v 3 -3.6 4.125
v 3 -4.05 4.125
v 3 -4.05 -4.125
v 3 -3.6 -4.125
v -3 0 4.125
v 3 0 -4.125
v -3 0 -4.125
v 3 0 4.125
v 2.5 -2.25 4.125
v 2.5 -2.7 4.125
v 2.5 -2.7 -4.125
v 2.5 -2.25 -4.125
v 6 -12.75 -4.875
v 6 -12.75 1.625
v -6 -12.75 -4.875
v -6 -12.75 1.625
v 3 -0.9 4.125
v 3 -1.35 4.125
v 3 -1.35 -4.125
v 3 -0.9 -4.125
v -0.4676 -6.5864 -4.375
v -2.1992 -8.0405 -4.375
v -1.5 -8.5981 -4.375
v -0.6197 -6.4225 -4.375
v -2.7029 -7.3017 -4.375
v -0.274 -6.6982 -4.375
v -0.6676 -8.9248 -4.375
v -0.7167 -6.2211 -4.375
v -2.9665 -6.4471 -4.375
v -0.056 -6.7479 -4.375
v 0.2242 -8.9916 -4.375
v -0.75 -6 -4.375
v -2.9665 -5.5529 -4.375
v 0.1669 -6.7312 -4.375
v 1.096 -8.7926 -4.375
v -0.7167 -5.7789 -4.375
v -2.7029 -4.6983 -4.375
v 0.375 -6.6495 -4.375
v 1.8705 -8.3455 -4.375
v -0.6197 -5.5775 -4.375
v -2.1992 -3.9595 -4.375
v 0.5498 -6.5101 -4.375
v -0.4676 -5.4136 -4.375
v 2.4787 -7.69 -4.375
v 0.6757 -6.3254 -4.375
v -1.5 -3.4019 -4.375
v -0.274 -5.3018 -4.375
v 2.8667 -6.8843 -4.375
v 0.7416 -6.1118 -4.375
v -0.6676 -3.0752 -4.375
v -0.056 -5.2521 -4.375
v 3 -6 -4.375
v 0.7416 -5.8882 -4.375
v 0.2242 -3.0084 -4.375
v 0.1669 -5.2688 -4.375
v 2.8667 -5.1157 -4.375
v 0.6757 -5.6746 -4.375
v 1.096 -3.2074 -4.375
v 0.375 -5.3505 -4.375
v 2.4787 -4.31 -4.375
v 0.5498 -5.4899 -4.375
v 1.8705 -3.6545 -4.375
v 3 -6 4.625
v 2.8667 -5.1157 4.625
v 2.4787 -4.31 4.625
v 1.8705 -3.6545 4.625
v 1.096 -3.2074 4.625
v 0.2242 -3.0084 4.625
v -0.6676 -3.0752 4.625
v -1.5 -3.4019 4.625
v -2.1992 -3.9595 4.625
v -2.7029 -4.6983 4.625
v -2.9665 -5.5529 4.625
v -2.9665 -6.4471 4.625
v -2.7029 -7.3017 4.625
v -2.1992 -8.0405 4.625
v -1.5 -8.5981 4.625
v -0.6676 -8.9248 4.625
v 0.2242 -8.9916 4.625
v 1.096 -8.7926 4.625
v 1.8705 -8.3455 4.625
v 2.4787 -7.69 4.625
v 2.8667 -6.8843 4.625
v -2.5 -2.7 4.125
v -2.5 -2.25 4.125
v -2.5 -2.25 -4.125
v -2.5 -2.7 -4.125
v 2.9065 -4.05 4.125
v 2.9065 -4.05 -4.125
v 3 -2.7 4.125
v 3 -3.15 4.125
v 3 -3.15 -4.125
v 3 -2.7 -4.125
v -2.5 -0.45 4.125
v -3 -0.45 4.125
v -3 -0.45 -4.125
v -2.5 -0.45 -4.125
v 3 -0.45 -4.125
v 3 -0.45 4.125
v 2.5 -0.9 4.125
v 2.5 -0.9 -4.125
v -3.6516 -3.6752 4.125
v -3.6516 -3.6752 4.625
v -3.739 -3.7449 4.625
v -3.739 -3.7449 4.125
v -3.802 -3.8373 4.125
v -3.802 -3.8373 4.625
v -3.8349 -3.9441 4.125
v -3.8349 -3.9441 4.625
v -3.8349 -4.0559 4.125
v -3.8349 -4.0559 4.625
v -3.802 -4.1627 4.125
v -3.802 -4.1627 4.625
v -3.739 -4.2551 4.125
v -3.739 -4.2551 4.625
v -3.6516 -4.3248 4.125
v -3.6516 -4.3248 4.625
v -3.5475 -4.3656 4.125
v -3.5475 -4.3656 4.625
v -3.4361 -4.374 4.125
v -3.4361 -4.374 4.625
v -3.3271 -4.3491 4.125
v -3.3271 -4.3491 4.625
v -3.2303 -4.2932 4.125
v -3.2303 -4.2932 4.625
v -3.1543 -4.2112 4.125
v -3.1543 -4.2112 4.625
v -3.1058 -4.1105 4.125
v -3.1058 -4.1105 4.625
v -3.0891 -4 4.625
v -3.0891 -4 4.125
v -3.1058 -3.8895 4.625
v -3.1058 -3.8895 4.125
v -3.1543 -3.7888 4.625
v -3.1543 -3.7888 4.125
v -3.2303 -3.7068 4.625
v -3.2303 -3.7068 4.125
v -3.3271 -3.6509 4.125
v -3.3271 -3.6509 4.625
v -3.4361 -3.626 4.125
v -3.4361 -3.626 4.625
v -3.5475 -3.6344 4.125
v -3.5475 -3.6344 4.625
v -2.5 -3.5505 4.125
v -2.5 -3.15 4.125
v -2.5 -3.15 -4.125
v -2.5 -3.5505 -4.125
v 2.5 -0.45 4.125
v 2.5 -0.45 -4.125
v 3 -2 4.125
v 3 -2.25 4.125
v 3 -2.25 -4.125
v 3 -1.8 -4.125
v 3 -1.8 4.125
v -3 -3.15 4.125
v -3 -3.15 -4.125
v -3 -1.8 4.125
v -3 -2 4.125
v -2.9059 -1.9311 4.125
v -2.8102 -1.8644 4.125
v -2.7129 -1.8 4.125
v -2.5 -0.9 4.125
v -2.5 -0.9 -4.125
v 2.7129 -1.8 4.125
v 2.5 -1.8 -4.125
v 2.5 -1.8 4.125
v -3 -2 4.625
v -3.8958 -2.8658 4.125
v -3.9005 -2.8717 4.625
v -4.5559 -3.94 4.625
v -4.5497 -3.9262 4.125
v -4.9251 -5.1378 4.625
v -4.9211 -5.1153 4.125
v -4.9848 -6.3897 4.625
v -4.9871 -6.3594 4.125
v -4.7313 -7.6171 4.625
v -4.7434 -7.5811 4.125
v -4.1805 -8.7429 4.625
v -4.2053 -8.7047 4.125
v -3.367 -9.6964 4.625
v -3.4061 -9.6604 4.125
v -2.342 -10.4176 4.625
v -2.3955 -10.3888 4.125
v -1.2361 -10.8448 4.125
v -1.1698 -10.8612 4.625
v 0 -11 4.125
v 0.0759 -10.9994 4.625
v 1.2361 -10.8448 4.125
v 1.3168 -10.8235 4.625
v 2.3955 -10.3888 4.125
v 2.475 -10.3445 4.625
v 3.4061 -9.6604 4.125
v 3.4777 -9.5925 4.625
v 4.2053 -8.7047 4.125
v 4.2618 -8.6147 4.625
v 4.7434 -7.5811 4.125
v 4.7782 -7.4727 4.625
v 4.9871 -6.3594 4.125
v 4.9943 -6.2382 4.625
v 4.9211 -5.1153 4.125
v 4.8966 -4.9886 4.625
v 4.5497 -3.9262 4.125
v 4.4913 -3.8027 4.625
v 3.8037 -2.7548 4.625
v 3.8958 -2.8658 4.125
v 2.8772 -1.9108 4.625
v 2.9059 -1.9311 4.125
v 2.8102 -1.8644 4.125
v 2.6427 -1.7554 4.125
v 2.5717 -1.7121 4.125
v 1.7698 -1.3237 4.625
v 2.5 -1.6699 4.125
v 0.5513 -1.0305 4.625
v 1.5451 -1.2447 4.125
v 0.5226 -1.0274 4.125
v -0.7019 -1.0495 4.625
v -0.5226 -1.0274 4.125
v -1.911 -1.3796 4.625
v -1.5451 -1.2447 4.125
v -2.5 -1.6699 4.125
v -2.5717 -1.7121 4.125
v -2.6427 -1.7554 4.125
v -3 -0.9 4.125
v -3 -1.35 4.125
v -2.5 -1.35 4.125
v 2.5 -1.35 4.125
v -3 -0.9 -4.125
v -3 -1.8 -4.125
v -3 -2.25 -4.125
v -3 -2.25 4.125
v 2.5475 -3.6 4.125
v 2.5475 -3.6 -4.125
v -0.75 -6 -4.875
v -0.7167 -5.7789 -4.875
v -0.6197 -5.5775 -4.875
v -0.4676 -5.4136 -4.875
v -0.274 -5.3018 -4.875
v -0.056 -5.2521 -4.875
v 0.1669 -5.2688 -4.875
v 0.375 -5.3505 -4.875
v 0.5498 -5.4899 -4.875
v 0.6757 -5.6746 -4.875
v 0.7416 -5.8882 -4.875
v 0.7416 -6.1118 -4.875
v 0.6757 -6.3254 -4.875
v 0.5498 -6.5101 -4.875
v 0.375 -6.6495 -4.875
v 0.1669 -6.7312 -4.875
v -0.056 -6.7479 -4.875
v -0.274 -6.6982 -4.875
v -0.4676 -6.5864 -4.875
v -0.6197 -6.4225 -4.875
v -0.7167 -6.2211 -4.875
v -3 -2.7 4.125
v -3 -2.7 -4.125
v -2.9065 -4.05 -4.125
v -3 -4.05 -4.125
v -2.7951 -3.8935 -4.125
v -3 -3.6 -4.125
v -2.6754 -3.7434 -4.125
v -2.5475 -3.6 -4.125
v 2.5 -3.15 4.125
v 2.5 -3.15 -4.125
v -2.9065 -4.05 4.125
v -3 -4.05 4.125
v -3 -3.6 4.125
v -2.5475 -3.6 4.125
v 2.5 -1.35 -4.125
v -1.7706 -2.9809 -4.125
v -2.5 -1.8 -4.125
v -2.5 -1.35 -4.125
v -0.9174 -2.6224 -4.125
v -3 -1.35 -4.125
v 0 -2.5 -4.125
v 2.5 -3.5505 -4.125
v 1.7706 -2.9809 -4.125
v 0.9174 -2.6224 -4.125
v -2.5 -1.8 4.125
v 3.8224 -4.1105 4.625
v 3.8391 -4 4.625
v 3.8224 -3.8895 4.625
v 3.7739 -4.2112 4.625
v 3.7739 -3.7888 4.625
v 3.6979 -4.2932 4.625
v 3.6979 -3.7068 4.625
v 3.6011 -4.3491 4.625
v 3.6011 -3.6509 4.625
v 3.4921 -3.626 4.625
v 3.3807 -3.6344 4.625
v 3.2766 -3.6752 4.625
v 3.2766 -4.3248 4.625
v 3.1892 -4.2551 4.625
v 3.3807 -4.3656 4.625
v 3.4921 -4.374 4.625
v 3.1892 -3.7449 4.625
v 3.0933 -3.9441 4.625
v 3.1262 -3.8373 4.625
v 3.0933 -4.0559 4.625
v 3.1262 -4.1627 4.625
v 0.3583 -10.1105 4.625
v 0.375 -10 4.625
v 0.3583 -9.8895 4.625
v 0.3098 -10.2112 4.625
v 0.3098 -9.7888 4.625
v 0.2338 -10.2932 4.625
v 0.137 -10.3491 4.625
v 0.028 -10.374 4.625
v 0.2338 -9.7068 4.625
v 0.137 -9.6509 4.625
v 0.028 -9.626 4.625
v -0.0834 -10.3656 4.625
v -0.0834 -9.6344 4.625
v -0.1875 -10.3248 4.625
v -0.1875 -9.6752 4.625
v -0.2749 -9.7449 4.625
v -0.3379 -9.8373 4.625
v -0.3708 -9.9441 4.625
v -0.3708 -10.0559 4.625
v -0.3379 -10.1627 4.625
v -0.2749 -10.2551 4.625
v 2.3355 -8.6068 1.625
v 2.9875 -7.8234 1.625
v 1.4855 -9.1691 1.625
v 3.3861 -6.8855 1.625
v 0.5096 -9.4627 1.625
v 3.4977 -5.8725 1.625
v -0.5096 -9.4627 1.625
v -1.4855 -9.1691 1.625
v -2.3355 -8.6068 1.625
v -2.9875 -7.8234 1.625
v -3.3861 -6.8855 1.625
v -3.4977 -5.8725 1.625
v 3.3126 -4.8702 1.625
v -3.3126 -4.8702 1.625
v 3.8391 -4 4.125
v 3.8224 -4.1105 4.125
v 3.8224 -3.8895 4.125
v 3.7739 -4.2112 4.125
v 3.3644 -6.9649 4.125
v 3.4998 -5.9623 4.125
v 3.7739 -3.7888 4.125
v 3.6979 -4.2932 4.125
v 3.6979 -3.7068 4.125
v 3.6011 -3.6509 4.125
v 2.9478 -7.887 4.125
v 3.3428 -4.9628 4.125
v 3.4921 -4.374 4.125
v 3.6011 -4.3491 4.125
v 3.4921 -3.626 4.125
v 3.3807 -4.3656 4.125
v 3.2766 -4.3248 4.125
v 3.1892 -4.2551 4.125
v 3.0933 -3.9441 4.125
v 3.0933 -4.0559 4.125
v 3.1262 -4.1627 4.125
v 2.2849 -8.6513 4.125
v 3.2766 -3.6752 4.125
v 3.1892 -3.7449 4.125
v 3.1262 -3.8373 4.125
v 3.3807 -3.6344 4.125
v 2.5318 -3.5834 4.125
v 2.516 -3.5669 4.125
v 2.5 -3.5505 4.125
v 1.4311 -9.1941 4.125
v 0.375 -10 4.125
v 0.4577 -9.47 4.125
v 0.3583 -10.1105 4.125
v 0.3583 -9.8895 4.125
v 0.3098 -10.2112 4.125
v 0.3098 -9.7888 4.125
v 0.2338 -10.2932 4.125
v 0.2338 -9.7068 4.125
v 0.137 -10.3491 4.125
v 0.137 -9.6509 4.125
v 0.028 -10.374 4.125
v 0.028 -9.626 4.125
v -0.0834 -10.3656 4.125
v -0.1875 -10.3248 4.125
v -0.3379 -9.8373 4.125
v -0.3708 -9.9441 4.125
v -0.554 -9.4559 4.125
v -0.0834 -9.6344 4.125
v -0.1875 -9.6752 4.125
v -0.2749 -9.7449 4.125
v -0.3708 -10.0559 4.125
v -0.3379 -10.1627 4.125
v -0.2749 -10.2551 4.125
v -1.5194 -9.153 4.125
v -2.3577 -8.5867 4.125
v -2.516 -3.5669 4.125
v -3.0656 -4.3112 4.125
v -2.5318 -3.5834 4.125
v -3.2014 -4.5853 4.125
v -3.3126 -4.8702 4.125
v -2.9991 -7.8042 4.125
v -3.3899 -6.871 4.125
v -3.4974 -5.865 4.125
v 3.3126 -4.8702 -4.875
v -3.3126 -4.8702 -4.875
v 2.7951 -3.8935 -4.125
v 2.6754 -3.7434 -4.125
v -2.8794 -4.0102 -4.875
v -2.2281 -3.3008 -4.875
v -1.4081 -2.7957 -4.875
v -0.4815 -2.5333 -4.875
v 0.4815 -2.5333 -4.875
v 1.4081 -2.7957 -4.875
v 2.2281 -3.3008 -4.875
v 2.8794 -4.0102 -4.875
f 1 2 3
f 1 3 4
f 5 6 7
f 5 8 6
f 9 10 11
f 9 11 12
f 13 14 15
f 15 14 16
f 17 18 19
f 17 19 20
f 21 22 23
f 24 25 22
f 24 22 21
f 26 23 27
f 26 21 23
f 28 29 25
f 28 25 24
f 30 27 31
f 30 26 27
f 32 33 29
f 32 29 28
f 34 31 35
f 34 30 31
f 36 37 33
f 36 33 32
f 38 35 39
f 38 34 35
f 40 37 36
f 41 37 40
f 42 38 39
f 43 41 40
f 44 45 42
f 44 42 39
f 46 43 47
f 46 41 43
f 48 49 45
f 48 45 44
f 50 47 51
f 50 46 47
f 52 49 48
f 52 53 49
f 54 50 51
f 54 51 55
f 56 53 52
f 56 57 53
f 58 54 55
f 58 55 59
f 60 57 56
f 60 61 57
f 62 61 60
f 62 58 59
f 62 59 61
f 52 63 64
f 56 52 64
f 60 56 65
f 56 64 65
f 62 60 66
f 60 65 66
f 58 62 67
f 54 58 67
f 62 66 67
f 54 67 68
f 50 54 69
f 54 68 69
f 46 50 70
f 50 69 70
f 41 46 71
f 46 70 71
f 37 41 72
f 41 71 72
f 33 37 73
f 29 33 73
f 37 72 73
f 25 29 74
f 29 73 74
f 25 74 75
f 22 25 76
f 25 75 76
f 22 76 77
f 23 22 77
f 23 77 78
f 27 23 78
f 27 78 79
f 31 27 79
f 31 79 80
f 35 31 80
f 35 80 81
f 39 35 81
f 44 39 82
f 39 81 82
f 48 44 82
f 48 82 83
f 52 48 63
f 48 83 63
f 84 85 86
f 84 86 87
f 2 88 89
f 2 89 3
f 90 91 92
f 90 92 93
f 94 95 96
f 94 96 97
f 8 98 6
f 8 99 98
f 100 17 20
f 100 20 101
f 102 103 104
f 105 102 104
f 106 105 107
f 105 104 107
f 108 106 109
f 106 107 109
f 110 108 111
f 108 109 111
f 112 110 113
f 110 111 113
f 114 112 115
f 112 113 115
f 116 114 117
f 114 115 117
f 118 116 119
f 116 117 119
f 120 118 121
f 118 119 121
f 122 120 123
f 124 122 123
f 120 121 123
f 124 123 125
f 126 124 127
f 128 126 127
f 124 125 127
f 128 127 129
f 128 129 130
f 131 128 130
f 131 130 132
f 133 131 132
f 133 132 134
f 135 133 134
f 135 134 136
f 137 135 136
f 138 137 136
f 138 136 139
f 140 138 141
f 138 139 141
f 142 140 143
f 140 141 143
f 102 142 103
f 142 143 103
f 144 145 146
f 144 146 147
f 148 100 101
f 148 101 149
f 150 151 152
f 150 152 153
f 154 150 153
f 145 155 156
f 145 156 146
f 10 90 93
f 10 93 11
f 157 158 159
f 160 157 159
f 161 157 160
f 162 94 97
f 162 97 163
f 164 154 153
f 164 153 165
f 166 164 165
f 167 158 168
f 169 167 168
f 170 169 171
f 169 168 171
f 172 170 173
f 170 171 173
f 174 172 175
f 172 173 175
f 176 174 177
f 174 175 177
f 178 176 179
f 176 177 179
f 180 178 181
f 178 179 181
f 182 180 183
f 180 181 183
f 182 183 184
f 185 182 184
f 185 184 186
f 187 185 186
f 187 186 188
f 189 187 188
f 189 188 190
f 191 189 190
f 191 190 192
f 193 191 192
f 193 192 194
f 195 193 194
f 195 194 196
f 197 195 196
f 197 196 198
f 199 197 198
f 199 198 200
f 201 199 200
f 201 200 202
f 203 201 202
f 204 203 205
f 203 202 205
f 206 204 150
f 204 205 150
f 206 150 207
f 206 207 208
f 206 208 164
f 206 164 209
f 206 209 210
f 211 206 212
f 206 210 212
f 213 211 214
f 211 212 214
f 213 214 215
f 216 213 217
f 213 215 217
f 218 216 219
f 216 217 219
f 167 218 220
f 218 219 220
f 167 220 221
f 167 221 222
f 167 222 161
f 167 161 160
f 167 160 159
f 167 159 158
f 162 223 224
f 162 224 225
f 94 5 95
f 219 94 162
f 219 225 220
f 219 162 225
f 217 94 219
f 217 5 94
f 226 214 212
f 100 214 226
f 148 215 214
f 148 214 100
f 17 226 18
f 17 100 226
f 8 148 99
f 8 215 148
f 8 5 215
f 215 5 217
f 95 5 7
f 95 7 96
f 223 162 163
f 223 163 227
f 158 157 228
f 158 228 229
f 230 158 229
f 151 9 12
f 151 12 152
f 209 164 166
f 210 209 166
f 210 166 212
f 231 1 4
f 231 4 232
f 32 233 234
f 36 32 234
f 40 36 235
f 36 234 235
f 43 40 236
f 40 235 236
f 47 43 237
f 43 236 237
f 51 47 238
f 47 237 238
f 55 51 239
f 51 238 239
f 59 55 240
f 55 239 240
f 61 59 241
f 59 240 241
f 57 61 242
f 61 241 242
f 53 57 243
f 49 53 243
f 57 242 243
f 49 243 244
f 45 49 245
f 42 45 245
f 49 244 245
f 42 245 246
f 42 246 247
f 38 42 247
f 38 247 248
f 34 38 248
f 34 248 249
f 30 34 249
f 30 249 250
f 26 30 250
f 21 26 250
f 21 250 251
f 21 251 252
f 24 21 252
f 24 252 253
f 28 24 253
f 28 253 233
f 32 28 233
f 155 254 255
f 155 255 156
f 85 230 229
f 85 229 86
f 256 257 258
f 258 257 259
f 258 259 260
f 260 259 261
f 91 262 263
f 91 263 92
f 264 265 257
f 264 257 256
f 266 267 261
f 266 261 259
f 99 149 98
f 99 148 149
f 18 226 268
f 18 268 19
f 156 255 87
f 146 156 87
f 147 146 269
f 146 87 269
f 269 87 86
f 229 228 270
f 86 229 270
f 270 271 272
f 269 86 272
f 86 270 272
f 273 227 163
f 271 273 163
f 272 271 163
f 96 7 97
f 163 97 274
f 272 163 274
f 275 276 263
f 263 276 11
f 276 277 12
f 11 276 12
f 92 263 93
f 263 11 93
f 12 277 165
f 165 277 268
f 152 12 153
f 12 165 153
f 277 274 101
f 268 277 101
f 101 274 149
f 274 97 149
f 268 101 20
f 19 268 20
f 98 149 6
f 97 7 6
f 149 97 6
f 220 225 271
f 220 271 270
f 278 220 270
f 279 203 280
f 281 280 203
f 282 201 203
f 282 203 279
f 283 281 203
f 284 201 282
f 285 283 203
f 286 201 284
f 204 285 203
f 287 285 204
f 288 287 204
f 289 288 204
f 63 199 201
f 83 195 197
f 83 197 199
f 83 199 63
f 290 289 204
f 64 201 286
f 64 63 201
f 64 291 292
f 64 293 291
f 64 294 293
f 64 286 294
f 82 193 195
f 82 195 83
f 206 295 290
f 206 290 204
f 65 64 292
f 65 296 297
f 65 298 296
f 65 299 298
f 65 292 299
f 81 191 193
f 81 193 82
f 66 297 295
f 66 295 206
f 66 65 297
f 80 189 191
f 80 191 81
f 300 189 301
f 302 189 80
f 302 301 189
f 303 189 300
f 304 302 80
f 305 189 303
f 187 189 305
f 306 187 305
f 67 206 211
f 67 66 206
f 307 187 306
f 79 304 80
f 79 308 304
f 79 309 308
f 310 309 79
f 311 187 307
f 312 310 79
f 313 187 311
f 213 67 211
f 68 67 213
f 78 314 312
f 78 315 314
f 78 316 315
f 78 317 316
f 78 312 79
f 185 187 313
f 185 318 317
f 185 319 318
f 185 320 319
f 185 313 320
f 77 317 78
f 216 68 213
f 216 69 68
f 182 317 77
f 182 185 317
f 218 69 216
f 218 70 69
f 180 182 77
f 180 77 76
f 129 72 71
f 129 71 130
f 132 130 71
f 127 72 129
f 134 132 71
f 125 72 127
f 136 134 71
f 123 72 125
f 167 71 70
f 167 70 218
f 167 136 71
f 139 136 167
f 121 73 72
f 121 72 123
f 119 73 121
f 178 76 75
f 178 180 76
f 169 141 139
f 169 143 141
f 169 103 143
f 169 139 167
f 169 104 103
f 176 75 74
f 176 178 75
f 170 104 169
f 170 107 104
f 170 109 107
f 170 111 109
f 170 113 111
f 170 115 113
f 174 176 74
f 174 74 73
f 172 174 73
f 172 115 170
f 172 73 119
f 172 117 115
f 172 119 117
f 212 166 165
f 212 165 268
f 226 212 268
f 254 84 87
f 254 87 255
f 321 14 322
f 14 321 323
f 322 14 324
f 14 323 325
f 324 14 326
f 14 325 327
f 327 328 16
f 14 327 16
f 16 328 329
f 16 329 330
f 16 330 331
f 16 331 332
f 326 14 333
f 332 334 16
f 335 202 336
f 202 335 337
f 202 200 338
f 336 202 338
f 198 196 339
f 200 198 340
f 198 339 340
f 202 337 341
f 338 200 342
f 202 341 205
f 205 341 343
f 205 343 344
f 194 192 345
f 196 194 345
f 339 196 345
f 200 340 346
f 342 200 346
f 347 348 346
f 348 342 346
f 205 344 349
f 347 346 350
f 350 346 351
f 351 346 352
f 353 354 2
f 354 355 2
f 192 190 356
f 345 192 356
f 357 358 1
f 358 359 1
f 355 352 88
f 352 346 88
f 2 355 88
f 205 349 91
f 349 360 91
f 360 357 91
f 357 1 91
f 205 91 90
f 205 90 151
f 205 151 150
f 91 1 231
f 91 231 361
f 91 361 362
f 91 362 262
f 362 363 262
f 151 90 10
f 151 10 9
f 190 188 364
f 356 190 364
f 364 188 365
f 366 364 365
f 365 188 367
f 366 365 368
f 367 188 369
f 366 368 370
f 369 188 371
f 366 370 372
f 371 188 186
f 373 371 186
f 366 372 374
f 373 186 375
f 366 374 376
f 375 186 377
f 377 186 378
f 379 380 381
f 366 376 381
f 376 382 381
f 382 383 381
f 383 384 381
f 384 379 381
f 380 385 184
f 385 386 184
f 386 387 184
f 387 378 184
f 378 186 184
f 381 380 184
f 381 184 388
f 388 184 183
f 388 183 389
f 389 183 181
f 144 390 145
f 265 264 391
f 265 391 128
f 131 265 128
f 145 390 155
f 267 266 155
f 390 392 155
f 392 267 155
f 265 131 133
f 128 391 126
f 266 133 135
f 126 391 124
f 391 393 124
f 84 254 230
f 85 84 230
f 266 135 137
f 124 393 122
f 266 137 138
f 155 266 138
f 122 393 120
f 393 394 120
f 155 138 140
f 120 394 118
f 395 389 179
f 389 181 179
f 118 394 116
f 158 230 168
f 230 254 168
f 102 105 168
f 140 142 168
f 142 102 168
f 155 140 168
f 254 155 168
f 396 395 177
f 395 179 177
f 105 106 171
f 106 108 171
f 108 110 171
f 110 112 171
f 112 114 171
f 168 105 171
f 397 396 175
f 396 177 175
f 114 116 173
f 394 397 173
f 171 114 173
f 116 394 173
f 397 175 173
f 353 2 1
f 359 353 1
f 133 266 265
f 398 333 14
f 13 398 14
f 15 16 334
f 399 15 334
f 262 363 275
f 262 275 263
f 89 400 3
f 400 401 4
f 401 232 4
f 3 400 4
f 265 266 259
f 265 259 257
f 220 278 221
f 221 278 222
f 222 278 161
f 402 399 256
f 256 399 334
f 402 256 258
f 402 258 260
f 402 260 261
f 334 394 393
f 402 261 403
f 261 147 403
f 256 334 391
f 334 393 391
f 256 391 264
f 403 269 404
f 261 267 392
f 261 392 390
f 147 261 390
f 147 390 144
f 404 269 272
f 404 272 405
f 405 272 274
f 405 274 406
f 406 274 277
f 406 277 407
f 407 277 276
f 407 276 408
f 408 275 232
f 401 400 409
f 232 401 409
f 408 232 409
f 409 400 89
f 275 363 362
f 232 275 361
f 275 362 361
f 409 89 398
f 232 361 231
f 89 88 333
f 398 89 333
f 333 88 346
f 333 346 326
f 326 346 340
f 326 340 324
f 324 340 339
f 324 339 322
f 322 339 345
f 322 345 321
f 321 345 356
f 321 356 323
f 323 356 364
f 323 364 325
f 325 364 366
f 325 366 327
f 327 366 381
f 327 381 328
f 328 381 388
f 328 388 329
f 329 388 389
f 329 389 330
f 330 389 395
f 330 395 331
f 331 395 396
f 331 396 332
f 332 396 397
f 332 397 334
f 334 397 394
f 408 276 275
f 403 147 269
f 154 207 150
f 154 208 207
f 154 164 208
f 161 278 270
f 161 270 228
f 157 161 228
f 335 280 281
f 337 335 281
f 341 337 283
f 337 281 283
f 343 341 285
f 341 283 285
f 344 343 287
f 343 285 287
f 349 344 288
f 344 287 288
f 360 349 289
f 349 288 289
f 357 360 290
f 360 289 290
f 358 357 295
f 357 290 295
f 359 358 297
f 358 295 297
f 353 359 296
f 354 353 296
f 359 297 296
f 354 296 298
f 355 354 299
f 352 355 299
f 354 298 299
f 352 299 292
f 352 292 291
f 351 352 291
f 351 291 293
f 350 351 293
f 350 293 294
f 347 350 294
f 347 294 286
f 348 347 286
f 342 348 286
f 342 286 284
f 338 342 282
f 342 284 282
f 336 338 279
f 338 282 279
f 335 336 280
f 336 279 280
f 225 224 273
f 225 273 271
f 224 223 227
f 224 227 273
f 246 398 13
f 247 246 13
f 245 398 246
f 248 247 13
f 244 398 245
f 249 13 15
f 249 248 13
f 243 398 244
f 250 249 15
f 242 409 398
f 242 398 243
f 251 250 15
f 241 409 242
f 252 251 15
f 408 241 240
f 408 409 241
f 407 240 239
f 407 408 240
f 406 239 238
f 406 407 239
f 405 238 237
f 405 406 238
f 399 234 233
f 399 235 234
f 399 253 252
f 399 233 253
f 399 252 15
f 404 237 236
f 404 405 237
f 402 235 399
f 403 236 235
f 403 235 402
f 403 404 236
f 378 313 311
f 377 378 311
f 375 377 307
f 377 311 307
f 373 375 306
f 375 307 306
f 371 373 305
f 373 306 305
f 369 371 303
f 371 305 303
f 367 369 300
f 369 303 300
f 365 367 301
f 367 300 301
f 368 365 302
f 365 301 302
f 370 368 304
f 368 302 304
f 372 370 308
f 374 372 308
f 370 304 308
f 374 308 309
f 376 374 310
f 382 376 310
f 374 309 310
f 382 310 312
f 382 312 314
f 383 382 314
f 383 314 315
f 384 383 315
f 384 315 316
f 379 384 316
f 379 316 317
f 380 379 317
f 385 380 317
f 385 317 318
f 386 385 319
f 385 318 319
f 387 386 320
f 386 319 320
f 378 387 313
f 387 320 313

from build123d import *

# Parameters (mm, degrees)
BOSS_EXTRUDE1_DEPTH = 4.125
SKETCH2_R           = 5
BOSS_EXTRUDE2_DEPTH = 0.5
SKETCH3_R           = 3.5
CUT_EXTRUDE1_DEPTH  = 9
SKETCH4_R           = 0.375
CUT_EXTRUDE2_DEPTH  = 0.5
CIRPATTERN1_COUNT   = 3
BOSS_EXTRUDE3_START = 6.5
BOSS_EXTRUDE3_DEPTH = 6.5
SKETCH7_R           = 3.5
BOSS_EXTRUDE4_DEPTH = 6.5
SKETCH8_R           = 3
CUT_EXTRUDE3_DEPTH  = 9
SKETCH6_R           = 0.75
CUT_EXTRUDE4_DEPTH  = 9


with BuildPart() as part:
    # Sketch1 → Boss-Extrude1 (new, symmetric)
    with BuildSketch(Plane.XY):
        Polygon((3, 0), (-3, 0), (-3, -0.45), (-2.5, -0.45), (-2.5, -0.9), (-3, -0.9), (-3, -1.35), (-2.5, -1.35), (-2.5, -1.8), (-3, -1.8), (-3, -2.25), (-2.5, -2.25), (-2.5, -2.7), (-3, -2.7), (-3, -3.15), (-2.5, -3.15), (-2.5, -3.6), (-3, -3.6), (-3, -4.05), (-2.5, -4.05), (-2.5, -4.5), (-3, -4.5), (-3, -4.95), (-2.5, -4.95), (-2.5, -5.4), (-3, -5.4), (-3, -5.85), (-2.5, -5.85), (-2.5, -6.3), (2.5, -6.3), (2.5, -5.85), (3, -5.85), (3, -5.4), (2.5, -5.4), (2.5, -4.95), (3, -4.95), (3, -4.5), (2.5, -4.5), (2.5, -4.05), (3, -4.05), (3, -3.6), (2.5, -3.6), (2.5, -3.15), (3, -3.15), (3, -2.7), (2.5, -2.7), (2.5, -2.25), (3, -2.25), (3, -1.8), (2.5, -1.8), (2.5, -1.35), (3, -1.35), (3, -0.9), (2.5, -0.9), (2.5, -0.45), (3, -0.45), align=None)
    extrude(amount=BOSS_EXTRUDE1_DEPTH, both=True)

    # Sketch2 → Boss-Extrude2 (add)
    with BuildSketch(Plane.XY.offset(4.125)):
        with Locations(Location((0, -6, 0), (0, 0, 126.869897646))):
            Circle(SKETCH2_R)
    extrude(amount=BOSS_EXTRUDE2_DEPTH)

    # Sketch3 → Cut-Extrude1 (cut)
    with BuildSketch(Plane.XY.offset(4.625)):
        with Locations((0, -6)):
            Circle(SKETCH3_R)
    extrude(amount=-CUT_EXTRUDE1_DEPTH, mode=Mode.SUBTRACT)

    # Sketch4 → Cut-Extrude2 (cut)
    with BuildSketch(Plane.XY.offset(4.625)):
        with Locations((3.464101615, -4)):
            Circle(SKETCH4_R)
    cut_extrude2 = extrude(amount=-CUT_EXTRUDE2_DEPTH, mode=Mode.SUBTRACT)

    # CirPattern1: Cut-Extrude2 ×3 about axis
    cirpattern1_axis = Axis((0, -6, 0), (0, 0, 1))
    for i in range(1, CIRPATTERN1_COUNT):
        add(cut_extrude2.rotate(cirpattern1_axis, i * 360 / CIRPATTERN1_COUNT), mode=Mode.SUBTRACT)

    # Sketch5 → Boss-Extrude3 (add)
    with BuildSketch(Plane.XY.offset(-4.875).offset(BOSS_EXTRUDE3_START)):
        with BuildLine():
            Line((6, -12.75), (-6, -12.75))
            Line((-6, -12.75), (-3.312648335, -4.870238517))
            ThreePointArc((-3.312648335, -4.870238517), (0, -2.5), (3.312648335, -4.870238517))
            Line((3.312648335, -4.870238517), (6, -12.75))
        make_face()
    extrude(amount=-BOSS_EXTRUDE3_DEPTH)

    # Sketch7 → Boss-Extrude4 (add)
    with BuildSketch(Plane.XY.offset(4.625)):
        with Locations(Location((0, -6, 0), (0, 0, 161.168324383))):
            Circle(SKETCH7_R)
    extrude(amount=-BOSS_EXTRUDE4_DEPTH)

    # Sketch8 → Cut-Extrude3 (cut)
    with BuildSketch(Plane.XY.offset(4.625)):
        with Locations((0, -6)):
            Circle(SKETCH8_R)
    extrude(amount=-CUT_EXTRUDE3_DEPTH, mode=Mode.SUBTRACT)

    # Sketch6 → Cut-Extrude4 (cut)
    with BuildSketch(Plane(origin=(0, 0, -4.875), x_dir=(-1, 0, 0), z_dir=(0, 0, -1))):
        with Locations((0, -6)):
            Circle(SKETCH6_R)
    extrude(amount=-CUT_EXTRUDE4_DEPTH, mode=Mode.SUBTRACT)


solid = part.part
